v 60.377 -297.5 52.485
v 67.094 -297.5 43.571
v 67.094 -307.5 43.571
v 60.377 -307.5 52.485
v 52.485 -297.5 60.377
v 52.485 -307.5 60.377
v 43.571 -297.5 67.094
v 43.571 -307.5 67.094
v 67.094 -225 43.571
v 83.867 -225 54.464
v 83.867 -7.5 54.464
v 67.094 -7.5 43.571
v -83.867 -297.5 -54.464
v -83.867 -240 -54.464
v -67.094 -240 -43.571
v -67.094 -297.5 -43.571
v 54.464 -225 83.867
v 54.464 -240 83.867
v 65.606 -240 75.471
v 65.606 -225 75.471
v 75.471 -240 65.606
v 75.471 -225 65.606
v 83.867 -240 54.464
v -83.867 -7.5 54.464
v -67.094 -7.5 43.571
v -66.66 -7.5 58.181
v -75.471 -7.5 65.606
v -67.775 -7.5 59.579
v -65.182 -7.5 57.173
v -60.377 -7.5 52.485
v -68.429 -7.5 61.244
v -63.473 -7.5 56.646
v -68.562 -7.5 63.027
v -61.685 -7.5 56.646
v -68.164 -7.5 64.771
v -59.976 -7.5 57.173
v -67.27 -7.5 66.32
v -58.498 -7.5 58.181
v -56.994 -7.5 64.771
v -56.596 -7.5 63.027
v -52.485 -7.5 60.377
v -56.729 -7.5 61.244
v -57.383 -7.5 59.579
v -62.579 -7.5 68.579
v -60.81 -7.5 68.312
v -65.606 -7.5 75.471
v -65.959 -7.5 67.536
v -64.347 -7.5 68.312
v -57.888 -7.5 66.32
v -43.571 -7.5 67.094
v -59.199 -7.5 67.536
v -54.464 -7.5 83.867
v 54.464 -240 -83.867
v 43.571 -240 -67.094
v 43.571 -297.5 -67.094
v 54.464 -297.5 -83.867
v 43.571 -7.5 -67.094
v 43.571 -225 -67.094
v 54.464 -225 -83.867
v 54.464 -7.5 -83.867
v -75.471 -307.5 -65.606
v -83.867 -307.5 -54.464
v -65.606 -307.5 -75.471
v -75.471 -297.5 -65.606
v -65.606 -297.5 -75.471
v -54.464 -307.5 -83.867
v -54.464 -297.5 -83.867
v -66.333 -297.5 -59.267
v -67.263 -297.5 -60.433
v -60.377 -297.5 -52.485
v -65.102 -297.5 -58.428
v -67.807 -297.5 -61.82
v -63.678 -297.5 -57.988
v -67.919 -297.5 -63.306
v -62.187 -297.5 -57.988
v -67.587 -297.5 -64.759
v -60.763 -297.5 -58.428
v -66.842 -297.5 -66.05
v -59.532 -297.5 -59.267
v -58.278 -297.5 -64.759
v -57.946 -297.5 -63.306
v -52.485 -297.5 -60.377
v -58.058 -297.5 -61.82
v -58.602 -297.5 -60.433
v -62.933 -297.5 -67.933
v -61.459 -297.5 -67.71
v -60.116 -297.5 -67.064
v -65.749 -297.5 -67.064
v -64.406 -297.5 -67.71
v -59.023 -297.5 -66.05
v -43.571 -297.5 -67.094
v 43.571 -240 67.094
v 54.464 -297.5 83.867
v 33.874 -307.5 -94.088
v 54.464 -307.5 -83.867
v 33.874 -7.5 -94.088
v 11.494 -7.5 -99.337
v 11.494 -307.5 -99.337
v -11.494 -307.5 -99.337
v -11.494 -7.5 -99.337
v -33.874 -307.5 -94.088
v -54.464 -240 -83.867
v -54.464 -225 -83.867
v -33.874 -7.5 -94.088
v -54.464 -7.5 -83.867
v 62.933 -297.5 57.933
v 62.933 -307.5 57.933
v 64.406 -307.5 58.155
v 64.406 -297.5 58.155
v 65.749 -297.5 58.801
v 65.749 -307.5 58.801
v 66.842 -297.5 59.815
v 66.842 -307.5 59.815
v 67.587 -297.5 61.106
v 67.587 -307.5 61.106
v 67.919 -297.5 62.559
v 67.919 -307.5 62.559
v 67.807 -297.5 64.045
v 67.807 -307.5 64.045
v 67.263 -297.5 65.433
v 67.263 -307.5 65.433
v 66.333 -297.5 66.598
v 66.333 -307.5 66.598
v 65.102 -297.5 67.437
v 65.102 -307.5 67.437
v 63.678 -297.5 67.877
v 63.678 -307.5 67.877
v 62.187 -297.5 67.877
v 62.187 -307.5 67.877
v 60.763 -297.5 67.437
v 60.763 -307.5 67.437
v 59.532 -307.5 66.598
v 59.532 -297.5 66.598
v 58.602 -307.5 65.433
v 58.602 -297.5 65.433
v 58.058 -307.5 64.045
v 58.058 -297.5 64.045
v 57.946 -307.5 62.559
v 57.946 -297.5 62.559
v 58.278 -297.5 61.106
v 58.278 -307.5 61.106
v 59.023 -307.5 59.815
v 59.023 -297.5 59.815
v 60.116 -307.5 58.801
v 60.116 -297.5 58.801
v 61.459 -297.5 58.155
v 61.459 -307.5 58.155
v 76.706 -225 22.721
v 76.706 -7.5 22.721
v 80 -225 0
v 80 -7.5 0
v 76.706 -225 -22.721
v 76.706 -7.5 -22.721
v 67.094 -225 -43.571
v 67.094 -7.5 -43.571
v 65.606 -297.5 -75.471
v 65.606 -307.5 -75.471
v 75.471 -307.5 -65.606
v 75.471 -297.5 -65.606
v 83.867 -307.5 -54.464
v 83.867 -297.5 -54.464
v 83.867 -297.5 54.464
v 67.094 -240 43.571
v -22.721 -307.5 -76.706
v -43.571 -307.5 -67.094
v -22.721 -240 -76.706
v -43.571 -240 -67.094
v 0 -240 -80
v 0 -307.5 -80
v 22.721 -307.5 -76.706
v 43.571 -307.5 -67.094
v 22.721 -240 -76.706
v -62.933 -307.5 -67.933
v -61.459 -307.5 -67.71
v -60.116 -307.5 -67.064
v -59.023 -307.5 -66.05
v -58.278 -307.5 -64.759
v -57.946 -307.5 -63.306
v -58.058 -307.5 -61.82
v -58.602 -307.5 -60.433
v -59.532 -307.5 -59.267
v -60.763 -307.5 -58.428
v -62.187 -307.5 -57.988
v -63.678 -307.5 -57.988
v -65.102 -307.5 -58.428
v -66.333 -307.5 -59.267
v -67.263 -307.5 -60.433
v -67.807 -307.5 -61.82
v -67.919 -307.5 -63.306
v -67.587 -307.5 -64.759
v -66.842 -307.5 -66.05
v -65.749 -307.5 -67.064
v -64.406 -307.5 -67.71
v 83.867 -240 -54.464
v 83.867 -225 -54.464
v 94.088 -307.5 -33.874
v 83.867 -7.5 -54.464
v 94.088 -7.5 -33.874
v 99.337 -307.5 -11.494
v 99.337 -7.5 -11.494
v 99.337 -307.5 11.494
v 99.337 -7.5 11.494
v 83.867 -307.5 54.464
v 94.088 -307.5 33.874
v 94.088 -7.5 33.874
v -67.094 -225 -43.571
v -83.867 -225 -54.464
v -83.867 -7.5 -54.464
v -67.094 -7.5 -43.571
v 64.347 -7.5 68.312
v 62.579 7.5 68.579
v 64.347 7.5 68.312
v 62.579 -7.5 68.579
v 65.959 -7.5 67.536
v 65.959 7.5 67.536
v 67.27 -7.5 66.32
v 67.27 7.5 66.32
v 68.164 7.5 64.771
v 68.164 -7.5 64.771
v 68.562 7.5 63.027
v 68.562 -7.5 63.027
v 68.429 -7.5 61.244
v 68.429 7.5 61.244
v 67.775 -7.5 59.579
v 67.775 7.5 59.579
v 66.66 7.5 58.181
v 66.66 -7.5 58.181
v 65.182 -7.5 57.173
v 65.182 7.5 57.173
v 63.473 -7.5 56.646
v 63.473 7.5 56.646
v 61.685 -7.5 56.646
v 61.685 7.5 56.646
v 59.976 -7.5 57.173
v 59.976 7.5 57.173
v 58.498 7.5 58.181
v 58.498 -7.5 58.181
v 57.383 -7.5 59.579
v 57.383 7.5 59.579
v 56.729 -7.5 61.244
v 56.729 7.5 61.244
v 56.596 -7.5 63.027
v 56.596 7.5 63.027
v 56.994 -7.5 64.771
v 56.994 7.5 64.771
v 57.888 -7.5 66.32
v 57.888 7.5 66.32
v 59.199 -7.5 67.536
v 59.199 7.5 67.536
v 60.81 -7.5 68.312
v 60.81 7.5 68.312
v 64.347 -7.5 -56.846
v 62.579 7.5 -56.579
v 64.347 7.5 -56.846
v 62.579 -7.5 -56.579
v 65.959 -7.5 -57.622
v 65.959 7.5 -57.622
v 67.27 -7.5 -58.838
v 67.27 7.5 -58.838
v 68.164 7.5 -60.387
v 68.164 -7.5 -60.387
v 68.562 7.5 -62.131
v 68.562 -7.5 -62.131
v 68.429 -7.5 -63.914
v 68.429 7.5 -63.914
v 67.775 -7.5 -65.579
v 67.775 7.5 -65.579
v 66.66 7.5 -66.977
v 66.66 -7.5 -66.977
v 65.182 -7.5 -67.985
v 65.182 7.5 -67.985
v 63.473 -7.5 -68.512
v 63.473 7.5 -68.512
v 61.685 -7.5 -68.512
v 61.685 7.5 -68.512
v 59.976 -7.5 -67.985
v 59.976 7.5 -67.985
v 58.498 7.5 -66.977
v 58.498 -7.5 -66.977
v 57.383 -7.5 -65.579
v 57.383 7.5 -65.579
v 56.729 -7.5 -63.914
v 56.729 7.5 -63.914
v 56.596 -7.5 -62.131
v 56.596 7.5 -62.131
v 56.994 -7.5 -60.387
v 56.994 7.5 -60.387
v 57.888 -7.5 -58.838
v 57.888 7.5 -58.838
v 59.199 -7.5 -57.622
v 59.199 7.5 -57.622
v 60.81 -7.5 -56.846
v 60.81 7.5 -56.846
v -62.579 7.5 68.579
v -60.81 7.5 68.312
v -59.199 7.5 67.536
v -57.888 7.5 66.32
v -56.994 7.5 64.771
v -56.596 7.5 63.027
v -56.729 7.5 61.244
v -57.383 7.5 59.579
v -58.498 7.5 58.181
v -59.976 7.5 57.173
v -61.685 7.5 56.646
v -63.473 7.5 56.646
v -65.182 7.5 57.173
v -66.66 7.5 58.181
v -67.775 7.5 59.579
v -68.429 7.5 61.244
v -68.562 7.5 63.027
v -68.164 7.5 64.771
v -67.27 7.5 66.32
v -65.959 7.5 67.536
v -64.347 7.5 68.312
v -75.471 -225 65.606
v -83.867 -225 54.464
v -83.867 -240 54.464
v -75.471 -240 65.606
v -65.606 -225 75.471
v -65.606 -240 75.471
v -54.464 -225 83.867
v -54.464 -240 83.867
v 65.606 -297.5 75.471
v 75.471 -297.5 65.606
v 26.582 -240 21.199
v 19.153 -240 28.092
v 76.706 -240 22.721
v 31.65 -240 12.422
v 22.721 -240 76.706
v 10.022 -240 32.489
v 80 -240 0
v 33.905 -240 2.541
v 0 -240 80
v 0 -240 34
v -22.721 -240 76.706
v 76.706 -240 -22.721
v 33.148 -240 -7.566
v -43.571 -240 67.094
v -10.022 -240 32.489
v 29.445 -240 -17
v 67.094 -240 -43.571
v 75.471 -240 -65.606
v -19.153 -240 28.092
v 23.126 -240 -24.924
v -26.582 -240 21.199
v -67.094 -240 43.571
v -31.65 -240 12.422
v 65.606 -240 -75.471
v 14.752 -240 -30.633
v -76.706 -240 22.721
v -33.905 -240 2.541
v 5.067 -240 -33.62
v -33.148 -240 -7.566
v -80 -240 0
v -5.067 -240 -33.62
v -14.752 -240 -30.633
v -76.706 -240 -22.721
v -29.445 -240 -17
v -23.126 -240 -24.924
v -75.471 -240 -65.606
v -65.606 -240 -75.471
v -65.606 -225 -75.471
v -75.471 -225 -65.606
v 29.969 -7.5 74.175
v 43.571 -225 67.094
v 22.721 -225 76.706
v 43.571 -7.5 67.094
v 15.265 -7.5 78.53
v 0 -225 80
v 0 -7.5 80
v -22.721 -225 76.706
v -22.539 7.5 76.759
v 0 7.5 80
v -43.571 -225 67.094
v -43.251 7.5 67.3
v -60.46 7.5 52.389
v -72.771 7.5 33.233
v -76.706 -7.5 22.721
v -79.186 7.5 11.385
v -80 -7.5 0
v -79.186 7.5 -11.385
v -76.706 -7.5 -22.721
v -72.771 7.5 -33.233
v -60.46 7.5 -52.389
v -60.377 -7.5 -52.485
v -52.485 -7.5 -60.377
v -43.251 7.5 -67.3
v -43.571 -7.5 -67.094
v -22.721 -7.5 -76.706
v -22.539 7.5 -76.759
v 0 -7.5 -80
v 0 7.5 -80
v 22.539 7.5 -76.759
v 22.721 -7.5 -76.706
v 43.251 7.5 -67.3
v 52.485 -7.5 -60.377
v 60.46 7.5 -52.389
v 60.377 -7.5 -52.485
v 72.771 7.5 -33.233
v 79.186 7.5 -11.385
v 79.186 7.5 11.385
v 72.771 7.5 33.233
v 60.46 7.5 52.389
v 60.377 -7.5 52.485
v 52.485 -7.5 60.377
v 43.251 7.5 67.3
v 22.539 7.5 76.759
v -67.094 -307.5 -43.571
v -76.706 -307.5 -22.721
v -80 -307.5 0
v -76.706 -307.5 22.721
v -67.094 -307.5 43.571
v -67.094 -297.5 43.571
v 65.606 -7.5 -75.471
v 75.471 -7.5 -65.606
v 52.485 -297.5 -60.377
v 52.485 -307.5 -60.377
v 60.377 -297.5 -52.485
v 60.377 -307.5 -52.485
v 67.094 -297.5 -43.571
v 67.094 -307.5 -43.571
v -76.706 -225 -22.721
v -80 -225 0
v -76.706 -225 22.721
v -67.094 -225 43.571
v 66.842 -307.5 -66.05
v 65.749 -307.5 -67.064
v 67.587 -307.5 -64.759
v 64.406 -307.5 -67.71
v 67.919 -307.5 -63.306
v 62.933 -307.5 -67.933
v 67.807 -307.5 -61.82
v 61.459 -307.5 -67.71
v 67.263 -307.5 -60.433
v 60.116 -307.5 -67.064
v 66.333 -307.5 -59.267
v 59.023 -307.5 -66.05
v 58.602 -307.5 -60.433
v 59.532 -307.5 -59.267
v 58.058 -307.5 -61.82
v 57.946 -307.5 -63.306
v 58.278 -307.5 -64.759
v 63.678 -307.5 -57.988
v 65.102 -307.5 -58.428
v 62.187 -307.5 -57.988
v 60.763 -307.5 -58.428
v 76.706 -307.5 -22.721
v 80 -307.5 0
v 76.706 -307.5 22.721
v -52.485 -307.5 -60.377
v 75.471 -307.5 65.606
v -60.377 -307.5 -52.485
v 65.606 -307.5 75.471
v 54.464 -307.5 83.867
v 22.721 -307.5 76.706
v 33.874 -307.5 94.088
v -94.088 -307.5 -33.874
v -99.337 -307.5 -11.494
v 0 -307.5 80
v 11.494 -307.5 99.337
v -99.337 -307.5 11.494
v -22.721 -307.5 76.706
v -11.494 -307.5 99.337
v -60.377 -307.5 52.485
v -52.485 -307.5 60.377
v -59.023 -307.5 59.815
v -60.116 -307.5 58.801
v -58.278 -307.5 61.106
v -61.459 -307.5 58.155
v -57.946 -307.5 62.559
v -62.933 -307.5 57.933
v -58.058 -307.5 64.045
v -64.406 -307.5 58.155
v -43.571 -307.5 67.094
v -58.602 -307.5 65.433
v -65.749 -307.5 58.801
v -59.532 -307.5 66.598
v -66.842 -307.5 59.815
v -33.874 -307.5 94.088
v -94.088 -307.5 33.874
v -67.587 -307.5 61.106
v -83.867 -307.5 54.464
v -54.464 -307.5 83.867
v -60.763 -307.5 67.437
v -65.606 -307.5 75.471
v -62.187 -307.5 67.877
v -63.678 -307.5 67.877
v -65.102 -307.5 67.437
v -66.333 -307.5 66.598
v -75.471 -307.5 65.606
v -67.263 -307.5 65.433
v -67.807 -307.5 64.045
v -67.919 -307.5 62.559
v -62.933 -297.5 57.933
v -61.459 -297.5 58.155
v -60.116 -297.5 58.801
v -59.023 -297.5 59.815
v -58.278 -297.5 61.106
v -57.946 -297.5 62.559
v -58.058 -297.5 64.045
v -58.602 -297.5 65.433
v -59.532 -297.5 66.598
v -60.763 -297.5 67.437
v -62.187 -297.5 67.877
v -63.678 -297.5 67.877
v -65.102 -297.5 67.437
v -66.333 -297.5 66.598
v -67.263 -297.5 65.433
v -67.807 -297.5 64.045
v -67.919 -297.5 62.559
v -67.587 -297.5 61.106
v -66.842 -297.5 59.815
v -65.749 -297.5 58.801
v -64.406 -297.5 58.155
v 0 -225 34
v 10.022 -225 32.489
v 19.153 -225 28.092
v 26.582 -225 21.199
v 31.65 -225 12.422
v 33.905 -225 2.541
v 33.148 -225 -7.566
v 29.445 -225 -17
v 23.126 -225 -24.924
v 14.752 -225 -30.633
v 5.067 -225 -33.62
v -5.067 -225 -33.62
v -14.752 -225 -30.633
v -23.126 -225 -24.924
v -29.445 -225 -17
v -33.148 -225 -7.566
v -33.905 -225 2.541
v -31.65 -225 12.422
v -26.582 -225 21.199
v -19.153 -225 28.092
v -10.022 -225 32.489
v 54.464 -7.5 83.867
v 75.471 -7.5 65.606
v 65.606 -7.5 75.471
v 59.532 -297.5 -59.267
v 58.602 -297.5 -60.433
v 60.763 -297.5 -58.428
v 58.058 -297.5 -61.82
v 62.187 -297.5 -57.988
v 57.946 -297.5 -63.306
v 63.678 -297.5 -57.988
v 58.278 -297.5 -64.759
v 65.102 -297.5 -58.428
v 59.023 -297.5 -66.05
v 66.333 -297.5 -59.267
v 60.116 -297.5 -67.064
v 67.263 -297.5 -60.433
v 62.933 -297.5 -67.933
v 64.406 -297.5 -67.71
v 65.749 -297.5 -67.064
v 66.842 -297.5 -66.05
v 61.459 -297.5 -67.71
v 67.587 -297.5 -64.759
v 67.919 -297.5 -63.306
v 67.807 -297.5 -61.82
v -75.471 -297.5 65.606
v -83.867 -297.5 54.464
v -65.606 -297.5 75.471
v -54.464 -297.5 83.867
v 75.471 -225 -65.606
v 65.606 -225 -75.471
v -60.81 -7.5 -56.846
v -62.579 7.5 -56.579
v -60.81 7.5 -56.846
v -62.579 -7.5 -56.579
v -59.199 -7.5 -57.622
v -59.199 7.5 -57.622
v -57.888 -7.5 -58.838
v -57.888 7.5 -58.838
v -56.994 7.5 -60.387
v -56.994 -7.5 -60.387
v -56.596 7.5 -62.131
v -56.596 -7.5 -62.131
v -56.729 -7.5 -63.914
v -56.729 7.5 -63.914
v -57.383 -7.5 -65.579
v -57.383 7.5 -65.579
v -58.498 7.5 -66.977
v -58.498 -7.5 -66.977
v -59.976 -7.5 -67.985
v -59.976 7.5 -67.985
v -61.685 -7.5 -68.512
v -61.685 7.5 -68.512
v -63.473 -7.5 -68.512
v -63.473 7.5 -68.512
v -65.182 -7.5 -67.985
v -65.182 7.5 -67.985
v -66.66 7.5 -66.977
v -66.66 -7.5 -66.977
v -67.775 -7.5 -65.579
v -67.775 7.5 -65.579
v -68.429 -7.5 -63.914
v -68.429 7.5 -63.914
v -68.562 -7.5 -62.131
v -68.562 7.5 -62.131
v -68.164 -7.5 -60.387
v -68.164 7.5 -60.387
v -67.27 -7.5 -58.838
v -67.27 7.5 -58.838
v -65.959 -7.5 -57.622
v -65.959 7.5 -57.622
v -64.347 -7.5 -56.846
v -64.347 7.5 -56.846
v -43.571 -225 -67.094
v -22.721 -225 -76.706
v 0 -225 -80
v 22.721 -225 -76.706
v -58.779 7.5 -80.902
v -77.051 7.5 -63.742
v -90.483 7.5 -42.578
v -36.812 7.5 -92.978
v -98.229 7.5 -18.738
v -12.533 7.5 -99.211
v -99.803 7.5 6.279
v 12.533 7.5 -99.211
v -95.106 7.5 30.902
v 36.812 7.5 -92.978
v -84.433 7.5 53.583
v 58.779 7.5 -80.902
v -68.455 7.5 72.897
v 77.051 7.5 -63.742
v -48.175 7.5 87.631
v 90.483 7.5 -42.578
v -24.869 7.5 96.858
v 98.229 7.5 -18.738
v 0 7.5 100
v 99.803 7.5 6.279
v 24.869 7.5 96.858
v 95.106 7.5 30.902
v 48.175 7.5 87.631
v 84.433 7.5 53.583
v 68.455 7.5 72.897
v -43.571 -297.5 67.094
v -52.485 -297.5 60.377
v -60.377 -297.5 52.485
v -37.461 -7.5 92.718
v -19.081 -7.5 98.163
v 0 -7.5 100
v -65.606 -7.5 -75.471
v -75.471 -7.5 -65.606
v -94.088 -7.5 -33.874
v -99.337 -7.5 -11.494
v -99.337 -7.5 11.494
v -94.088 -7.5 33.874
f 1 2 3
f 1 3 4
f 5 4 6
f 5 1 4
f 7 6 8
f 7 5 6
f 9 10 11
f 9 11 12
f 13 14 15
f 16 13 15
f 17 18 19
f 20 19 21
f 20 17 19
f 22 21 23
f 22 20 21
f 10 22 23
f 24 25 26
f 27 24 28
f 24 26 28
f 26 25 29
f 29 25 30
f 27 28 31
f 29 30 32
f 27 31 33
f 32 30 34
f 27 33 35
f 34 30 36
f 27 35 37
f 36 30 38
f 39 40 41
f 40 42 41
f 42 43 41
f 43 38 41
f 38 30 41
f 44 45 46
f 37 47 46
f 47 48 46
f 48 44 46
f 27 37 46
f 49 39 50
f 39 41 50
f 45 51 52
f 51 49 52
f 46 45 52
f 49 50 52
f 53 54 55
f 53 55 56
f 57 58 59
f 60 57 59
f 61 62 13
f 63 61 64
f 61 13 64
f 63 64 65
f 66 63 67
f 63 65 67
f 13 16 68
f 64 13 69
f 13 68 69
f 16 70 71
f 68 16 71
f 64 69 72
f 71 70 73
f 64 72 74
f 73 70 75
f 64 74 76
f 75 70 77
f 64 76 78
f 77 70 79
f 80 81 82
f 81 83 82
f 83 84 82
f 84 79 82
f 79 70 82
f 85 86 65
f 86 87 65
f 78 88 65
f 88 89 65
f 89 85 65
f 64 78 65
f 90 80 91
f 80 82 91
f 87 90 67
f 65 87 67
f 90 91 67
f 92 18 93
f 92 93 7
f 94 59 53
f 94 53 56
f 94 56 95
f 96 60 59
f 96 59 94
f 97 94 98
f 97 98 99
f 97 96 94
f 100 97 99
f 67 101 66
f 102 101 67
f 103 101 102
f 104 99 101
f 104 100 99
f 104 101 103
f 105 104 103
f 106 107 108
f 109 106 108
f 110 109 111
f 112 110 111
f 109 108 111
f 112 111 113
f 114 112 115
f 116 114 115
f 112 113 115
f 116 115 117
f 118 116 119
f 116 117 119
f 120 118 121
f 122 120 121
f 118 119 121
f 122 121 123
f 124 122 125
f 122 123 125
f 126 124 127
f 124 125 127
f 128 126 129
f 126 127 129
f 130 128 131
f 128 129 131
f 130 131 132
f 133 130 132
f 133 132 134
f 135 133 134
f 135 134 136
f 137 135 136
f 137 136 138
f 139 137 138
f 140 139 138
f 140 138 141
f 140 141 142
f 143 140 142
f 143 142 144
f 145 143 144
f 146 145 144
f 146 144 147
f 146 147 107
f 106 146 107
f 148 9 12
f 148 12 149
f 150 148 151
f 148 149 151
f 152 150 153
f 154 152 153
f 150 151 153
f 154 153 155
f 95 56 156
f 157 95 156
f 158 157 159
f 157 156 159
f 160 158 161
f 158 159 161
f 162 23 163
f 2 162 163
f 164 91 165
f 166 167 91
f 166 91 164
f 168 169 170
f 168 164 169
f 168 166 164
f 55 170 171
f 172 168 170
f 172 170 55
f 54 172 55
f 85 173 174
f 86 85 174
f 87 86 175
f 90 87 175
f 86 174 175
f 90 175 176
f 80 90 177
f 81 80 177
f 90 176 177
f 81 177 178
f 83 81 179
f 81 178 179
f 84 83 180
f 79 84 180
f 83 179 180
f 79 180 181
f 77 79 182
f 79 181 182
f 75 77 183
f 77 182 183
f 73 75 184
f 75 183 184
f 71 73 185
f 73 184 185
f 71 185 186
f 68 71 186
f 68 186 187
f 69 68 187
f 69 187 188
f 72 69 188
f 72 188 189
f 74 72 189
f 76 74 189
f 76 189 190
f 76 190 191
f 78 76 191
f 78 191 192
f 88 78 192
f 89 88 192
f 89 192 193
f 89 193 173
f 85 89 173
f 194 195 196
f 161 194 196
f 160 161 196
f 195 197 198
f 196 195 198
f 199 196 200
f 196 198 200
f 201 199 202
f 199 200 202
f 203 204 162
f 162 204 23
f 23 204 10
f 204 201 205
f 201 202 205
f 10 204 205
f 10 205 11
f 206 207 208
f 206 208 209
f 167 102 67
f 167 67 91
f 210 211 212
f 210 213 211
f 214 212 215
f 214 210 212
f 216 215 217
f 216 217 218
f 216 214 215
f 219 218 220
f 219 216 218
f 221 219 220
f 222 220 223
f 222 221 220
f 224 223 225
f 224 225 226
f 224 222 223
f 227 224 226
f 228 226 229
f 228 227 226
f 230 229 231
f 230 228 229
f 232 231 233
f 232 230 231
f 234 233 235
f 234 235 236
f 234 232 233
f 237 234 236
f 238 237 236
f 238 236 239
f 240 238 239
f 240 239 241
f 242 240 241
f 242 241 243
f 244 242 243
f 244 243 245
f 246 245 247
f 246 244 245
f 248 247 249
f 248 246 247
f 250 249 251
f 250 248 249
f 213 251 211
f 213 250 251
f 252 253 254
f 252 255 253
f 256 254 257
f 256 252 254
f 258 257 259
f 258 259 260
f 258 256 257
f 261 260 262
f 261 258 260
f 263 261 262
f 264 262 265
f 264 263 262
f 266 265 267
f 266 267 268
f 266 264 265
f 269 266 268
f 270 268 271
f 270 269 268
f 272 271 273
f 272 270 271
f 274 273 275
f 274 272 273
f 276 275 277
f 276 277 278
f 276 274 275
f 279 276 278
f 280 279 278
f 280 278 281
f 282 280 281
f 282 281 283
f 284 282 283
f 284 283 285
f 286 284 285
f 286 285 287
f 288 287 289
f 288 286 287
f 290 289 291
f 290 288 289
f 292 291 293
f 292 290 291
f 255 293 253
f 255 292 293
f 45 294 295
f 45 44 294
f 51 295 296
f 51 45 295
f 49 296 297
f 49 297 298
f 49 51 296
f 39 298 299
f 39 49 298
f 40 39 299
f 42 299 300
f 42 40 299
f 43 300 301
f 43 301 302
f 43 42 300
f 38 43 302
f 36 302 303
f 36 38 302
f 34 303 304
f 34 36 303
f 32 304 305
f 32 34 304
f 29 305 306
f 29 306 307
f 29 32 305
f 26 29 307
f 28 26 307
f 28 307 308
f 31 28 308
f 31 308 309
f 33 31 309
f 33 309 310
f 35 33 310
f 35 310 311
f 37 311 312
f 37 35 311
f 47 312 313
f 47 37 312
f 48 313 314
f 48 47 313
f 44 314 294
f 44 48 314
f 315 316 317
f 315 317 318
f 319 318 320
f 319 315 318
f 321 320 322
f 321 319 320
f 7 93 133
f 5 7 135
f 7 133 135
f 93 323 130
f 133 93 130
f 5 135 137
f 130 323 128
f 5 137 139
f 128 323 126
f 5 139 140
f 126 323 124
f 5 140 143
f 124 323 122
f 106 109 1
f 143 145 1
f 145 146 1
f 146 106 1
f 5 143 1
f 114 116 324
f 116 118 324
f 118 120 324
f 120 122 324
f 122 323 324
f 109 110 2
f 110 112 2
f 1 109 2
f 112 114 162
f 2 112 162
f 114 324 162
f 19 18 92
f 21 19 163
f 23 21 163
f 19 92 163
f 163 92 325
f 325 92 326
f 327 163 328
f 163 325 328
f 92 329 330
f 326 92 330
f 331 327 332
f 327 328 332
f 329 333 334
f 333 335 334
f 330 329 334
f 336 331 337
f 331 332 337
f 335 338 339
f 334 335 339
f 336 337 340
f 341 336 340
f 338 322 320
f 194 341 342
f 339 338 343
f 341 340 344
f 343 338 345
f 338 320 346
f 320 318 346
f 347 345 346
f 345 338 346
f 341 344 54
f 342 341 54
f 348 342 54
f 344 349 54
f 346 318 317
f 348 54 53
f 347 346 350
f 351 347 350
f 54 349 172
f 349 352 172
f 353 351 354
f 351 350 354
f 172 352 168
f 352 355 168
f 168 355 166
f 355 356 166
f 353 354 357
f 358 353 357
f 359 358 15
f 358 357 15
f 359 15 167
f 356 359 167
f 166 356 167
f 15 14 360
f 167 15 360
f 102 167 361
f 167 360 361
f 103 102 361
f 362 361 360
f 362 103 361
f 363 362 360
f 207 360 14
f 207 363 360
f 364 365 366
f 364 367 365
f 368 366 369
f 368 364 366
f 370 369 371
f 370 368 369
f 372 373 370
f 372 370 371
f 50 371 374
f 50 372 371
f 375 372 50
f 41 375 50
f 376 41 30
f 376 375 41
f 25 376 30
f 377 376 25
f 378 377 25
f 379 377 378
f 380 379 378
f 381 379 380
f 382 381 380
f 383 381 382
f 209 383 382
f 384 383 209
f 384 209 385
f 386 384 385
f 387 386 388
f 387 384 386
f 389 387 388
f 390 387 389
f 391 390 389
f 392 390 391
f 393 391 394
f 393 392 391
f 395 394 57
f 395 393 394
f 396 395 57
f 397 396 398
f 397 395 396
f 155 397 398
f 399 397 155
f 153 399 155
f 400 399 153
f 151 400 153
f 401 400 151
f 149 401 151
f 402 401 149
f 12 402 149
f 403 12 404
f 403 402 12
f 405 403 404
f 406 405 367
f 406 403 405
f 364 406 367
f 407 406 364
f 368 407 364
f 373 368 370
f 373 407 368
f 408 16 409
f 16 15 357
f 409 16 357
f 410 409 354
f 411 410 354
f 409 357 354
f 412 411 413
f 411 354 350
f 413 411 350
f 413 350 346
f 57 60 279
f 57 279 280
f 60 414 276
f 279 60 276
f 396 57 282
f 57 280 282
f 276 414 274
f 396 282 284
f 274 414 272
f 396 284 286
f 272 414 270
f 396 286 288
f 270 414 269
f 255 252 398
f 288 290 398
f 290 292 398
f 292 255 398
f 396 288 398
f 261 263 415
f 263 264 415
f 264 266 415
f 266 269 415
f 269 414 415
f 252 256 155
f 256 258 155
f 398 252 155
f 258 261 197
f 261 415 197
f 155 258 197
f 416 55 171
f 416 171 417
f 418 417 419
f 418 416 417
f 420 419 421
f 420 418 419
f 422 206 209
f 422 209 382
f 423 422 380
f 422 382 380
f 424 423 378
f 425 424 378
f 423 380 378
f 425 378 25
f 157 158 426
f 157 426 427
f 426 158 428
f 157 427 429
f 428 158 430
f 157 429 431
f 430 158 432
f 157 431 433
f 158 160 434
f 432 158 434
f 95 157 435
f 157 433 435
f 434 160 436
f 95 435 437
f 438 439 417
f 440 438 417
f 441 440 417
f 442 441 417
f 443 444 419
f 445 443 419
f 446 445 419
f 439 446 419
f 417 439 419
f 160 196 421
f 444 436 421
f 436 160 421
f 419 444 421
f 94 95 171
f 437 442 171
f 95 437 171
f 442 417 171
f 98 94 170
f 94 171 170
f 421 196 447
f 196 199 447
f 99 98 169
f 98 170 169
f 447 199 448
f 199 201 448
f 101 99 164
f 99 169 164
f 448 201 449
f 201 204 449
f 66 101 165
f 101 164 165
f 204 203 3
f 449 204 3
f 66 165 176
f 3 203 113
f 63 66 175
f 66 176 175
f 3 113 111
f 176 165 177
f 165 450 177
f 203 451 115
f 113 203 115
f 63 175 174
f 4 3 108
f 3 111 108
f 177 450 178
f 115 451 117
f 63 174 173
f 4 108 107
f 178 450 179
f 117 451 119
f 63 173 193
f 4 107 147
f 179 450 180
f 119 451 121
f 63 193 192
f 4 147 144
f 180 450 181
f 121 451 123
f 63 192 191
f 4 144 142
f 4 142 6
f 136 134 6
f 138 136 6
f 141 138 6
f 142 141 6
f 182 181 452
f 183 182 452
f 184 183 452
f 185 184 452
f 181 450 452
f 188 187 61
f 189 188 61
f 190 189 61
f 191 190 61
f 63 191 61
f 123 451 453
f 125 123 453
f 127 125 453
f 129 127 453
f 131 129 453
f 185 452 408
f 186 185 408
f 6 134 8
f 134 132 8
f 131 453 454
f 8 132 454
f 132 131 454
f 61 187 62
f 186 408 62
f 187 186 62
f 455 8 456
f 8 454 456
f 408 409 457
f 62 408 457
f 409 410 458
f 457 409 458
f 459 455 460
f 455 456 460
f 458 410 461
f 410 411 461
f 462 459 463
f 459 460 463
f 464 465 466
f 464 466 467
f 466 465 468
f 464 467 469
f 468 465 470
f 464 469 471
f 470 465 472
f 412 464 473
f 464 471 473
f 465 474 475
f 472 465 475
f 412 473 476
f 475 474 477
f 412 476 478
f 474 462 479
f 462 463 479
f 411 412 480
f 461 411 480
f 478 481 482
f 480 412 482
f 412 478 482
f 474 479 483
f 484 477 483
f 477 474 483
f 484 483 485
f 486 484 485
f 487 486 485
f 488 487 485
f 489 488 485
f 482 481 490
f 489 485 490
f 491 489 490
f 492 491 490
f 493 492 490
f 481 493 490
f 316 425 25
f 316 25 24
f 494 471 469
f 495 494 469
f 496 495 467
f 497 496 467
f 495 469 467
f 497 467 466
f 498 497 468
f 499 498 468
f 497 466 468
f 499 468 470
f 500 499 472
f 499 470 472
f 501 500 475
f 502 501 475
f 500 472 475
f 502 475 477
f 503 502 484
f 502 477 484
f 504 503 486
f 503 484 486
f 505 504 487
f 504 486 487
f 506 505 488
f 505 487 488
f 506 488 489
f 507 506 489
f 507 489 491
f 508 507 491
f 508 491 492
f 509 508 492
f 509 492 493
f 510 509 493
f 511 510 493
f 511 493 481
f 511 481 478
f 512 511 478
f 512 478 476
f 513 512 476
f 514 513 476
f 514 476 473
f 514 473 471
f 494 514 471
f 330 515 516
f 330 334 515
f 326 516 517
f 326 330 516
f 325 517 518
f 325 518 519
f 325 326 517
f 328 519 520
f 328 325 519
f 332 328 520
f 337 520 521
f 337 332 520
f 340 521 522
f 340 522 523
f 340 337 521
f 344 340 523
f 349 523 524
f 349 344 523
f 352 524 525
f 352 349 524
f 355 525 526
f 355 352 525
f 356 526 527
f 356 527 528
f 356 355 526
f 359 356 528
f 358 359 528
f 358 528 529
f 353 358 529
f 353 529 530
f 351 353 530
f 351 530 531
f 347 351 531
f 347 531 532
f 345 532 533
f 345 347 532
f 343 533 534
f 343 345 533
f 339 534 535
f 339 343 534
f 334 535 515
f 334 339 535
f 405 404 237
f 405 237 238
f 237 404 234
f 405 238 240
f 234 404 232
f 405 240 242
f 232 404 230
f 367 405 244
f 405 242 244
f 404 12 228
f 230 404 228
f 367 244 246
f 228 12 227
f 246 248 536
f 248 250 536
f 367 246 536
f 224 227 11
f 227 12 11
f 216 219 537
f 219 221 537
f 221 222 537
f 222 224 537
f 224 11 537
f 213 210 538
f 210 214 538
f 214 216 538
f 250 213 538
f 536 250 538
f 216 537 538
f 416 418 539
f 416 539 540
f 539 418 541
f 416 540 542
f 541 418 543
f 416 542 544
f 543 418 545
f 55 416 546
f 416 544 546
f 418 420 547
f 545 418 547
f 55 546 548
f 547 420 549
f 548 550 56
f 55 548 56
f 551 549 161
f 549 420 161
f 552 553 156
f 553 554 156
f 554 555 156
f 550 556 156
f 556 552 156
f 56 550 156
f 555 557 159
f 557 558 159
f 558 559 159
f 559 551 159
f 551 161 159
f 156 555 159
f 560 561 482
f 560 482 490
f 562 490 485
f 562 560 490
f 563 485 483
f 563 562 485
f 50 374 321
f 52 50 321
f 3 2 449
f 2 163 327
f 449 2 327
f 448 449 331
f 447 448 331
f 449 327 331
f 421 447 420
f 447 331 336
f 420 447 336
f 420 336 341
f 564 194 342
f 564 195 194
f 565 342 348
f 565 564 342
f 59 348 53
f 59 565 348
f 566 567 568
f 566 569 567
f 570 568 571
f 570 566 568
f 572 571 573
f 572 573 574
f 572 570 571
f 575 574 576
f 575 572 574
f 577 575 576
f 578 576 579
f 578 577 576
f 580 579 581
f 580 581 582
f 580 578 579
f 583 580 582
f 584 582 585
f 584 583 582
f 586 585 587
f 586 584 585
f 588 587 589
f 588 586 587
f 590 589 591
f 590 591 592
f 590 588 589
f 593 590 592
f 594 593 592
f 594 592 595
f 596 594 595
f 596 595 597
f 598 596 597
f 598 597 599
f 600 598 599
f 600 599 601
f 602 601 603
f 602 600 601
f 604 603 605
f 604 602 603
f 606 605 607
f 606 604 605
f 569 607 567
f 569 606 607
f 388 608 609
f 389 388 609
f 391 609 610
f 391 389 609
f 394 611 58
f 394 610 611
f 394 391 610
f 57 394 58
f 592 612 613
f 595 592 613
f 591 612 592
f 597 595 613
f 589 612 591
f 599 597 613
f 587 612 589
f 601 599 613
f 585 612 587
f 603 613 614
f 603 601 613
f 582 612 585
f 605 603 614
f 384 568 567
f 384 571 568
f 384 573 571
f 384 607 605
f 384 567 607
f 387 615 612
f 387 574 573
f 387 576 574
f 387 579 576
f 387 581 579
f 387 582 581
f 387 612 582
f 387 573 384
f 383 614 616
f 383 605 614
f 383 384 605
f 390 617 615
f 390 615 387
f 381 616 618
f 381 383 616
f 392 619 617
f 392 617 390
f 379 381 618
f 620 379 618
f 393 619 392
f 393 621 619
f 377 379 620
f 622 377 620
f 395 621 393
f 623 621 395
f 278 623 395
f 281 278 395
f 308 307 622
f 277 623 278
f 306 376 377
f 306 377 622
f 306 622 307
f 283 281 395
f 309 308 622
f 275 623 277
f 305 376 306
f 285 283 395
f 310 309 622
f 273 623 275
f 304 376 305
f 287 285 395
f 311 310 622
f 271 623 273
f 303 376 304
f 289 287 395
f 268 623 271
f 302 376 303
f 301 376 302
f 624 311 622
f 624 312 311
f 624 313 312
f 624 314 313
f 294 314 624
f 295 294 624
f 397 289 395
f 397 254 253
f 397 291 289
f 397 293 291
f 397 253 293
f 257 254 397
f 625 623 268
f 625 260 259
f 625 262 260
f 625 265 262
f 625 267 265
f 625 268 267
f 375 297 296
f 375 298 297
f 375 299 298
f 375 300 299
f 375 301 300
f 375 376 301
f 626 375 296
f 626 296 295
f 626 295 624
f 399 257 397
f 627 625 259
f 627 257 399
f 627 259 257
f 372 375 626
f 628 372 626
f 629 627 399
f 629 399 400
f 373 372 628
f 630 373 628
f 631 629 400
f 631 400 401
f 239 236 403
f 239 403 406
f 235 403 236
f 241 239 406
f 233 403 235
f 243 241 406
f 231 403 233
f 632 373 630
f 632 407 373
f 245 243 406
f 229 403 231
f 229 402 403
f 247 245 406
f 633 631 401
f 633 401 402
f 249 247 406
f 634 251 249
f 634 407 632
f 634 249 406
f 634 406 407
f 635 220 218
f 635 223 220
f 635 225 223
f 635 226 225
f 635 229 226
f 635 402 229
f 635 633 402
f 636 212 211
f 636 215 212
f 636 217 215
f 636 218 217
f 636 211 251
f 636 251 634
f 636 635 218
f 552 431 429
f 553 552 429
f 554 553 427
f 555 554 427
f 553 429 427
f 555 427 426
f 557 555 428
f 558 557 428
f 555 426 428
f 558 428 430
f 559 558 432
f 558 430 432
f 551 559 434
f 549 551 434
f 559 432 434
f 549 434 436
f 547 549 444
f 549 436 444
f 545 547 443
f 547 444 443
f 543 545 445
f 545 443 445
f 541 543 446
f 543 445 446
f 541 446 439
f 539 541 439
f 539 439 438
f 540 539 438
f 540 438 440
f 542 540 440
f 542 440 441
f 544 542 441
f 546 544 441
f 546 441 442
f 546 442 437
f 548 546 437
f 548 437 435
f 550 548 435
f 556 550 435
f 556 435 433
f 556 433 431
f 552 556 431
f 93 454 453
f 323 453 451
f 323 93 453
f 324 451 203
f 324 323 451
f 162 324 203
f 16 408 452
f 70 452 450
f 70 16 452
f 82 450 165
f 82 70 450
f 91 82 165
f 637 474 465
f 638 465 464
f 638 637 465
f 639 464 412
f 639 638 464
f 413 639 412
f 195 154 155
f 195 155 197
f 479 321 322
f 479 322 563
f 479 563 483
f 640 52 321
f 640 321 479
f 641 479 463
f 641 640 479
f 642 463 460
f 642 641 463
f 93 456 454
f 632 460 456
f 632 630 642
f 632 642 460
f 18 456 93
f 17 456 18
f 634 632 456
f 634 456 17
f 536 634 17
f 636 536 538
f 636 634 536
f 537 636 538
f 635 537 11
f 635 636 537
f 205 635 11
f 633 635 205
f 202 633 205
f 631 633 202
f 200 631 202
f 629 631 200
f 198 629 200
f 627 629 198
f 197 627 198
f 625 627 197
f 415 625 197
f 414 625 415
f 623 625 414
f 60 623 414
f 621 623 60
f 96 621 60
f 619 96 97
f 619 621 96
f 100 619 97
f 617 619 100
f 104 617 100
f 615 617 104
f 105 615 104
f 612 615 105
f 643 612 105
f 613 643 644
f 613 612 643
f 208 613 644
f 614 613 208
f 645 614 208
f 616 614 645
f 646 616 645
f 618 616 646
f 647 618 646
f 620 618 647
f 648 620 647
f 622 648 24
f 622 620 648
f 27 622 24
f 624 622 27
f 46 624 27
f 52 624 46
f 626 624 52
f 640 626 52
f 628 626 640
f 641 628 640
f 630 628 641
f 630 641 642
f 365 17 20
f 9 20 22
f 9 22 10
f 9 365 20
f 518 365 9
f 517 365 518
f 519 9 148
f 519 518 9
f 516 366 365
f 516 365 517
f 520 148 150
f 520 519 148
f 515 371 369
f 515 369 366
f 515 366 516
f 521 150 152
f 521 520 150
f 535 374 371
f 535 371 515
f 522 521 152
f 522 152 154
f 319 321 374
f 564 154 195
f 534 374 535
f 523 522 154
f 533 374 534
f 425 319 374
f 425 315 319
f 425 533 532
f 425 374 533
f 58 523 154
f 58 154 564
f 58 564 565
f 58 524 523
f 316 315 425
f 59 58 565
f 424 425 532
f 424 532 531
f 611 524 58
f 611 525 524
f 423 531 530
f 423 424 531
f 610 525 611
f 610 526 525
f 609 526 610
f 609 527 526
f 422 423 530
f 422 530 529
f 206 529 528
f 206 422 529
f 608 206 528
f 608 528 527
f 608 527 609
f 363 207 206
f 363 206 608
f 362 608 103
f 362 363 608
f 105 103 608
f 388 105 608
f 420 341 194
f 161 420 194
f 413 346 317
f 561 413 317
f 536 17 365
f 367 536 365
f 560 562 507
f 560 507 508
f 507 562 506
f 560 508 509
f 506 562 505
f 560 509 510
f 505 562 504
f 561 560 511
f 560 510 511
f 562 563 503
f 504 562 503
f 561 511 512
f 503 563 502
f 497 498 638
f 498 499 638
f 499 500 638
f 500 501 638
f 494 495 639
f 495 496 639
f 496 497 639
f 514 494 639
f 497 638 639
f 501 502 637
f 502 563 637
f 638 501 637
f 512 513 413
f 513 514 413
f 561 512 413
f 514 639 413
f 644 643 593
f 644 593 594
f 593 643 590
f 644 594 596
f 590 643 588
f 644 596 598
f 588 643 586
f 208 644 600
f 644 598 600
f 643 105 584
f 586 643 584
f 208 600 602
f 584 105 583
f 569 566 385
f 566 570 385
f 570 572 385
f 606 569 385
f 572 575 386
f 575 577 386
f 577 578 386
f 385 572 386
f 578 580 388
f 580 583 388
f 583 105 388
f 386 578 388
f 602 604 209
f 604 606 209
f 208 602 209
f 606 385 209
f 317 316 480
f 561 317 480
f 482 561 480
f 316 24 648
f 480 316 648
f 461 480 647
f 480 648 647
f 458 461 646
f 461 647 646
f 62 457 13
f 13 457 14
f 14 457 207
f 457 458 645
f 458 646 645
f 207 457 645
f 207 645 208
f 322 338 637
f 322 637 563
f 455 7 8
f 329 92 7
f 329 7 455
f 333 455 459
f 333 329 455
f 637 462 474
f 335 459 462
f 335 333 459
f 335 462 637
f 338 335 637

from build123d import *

# Parameters (mm, degrees)
IZIM1_R                     = 100
IZIM1_R_2                   = 80
IZIM1_R_3                   = 6
Y_KSEKLIK_EKSTR_ZYON1_DEPTH = 7.5
Y_KSEKLIK_EKSTR_ZYON2_DEPTH = 300
Y_KSEKLIK_EKSTR_ZYON3_START = -10
IZIM3_R                     = 100
IZIM3_R_2                   = 80
Y_KSEKLIK_EKSTR_ZYON3_DEPTH = 10
IZIM4_R                     = 5
KES_EKSTR_ZYON1_DEPTH       = 29
IZIM5_R                     = 100
IZIM5_R_2                   = 34
Y_KSEKLIK_EKSTR_ZYON4_DEPTH = 7.5


with BuildPart() as part:
    # izim1 → Y_kseklik-Ekstr_zyon1 (new, symmetric)
    with BuildSketch(Plane(origin=(0, 0, 0), x_dir=(1, 0, 0), z_dir=(0, 1, 0))):
        with Locations(Location((0, 0, 0), (0, 0, 270))):
            Circle(IZIM1_R)
        with Locations(Location((0, 0, 0), (0, 0, 270))):
            Circle(IZIM1_R_2, mode=Mode.SUBTRACT)
        with Locations(Location((62.578950135, 62.578950135, 0), (0, 0, 270))):
            Circle(IZIM1_R_3, mode=Mode.SUBTRACT)
        with Locations(Location((62.578950135, -62.578950135, 0), (0, 0, 270))):
            Circle(IZIM1_R_3, mode=Mode.SUBTRACT)
        with Locations(Location((-62.578950135, -62.578950135, 0), (0, 0, 270))):
            Circle(IZIM1_R_3, mode=Mode.SUBTRACT)
        with Locations(Location((-62.578950135, 62.578950135, 0), (0, 0, 270))):
            Circle(IZIM1_R_3, mode=Mode.SUBTRACT)
    extrude(amount=Y_KSEKLIK_EKSTR_ZYON1_DEPTH, both=True)

    # izim2 → Y_kseklik-Ekstr_zyon2 (add)
    with BuildSketch(Plane.XZ.offset(7.5)):
        with BuildLine():
            Line((-43.571122801, 67.093645436), (-54.463903502, 83.867056795))
            ThreePointArc((-54.463903502, 83.867056795), (0, 100), (54.463903502, 83.867056795))
            Line((54.463903502, 83.867056795), (43.571122801, 67.093645436))
            ThreePointArc((43.571122801, 67.093645436), (0, 80), (-43.571122801, 67.093645436))
        make_face()
        with BuildLine():
            Line((43.571122801, -67.093645436), (54.463903502, -83.867056795))
            ThreePointArc((54.463903502, -83.867056795), (0, -100), (-54.463903502, -83.867056795))
            Line((-54.463903502, -83.867056795), (-43.571122801, -67.093645436))
            ThreePointArc((-43.571122801, -67.093645436), (0, -80), (43.571122801, -67.093645436))
        make_face()
        with BuildLine():
            Line((-67.093645436, 43.571122801), (-83.867056795, 54.463903502))
            ThreePointArc((-83.867056795, 54.463903502), (-100, 0), (-83.867056795, -54.463903502))
            Line((-83.867056795, -54.463903502), (-67.093645436, -43.571122801))
            ThreePointArc((-67.093645436, -43.571122801), (-80, 0), (-67.093645436, 43.571122801))
        make_face()
        with BuildLine():
            Line((67.093645436, -43.571122801), (83.867056795, -54.463903502))
            ThreePointArc((83.867056795, -54.463903502), (100, 0), (83.867056795, 54.463903502))
            Line((83.867056795, 54.463903502), (67.093645436, 43.571122801))
            ThreePointArc((67.093645436, 43.571122801), (80, 0), (67.093645436, -43.571122801))
        make_face()
    extrude(amount=Y_KSEKLIK_EKSTR_ZYON2_DEPTH)

    # izim3 → Y_kseklik-Ekstr_zyon3 (add)
    with BuildSketch(Plane.XZ.offset(307.5).offset(Y_KSEKLIK_EKSTR_ZYON3_START)):
        with Locations(Location((0, 0, 0), (0, 0, 270))):
            Circle(IZIM3_R)
        with Locations(Location((0, 0, 0), (0, 0, 270))):
            Circle(IZIM3_R_2, mode=Mode.SUBTRACT)
    extrude(amount=Y_KSEKLIK_EKSTR_ZYON3_DEPTH)

    # izim4 → Kes-Ekstr_zyon1 (cut)
    with BuildSketch(Plane.XZ.offset(307.5)):
        with Locations(Location((62.932503526, -62.932503526, 0), (0, 0, 270))):
            Circle(IZIM4_R)
        with Locations(Location((-62.932503526, -62.932503526, 0), (0, 0, 270))):
            Circle(IZIM4_R)
        with Locations(Location((-62.932503526, 62.932503526, 0), (0, 0, 270))):
            Circle(IZIM4_R)
        with Locations(Location((62.932503526, 62.932503526, 0), (0, 0, 270))):
            Circle(IZIM4_R)
    extrude(amount=-KES_EKSTR_ZYON1_DEPTH, mode=Mode.SUBTRACT)

    # izim5 → Y_kseklik-Ekstr_zyon4 (add, symmetric)
    with BuildSketch(Plane(origin=(0, -232.5, 0), x_dir=(1, 0, 0), z_dir=(0, 1, 0))):
        with Locations(Location((0, 0, 0), (0, 0, 90))):
            Circle(IZIM5_R)
        with Locations(Location((0, 0, 0), (0, 0, 270))):
            Circle(IZIM5_R_2, mode=Mode.SUBTRACT)
    extrude(amount=Y_KSEKLIK_EKSTR_ZYON4_DEPTH, both=True)


solid = part.part
